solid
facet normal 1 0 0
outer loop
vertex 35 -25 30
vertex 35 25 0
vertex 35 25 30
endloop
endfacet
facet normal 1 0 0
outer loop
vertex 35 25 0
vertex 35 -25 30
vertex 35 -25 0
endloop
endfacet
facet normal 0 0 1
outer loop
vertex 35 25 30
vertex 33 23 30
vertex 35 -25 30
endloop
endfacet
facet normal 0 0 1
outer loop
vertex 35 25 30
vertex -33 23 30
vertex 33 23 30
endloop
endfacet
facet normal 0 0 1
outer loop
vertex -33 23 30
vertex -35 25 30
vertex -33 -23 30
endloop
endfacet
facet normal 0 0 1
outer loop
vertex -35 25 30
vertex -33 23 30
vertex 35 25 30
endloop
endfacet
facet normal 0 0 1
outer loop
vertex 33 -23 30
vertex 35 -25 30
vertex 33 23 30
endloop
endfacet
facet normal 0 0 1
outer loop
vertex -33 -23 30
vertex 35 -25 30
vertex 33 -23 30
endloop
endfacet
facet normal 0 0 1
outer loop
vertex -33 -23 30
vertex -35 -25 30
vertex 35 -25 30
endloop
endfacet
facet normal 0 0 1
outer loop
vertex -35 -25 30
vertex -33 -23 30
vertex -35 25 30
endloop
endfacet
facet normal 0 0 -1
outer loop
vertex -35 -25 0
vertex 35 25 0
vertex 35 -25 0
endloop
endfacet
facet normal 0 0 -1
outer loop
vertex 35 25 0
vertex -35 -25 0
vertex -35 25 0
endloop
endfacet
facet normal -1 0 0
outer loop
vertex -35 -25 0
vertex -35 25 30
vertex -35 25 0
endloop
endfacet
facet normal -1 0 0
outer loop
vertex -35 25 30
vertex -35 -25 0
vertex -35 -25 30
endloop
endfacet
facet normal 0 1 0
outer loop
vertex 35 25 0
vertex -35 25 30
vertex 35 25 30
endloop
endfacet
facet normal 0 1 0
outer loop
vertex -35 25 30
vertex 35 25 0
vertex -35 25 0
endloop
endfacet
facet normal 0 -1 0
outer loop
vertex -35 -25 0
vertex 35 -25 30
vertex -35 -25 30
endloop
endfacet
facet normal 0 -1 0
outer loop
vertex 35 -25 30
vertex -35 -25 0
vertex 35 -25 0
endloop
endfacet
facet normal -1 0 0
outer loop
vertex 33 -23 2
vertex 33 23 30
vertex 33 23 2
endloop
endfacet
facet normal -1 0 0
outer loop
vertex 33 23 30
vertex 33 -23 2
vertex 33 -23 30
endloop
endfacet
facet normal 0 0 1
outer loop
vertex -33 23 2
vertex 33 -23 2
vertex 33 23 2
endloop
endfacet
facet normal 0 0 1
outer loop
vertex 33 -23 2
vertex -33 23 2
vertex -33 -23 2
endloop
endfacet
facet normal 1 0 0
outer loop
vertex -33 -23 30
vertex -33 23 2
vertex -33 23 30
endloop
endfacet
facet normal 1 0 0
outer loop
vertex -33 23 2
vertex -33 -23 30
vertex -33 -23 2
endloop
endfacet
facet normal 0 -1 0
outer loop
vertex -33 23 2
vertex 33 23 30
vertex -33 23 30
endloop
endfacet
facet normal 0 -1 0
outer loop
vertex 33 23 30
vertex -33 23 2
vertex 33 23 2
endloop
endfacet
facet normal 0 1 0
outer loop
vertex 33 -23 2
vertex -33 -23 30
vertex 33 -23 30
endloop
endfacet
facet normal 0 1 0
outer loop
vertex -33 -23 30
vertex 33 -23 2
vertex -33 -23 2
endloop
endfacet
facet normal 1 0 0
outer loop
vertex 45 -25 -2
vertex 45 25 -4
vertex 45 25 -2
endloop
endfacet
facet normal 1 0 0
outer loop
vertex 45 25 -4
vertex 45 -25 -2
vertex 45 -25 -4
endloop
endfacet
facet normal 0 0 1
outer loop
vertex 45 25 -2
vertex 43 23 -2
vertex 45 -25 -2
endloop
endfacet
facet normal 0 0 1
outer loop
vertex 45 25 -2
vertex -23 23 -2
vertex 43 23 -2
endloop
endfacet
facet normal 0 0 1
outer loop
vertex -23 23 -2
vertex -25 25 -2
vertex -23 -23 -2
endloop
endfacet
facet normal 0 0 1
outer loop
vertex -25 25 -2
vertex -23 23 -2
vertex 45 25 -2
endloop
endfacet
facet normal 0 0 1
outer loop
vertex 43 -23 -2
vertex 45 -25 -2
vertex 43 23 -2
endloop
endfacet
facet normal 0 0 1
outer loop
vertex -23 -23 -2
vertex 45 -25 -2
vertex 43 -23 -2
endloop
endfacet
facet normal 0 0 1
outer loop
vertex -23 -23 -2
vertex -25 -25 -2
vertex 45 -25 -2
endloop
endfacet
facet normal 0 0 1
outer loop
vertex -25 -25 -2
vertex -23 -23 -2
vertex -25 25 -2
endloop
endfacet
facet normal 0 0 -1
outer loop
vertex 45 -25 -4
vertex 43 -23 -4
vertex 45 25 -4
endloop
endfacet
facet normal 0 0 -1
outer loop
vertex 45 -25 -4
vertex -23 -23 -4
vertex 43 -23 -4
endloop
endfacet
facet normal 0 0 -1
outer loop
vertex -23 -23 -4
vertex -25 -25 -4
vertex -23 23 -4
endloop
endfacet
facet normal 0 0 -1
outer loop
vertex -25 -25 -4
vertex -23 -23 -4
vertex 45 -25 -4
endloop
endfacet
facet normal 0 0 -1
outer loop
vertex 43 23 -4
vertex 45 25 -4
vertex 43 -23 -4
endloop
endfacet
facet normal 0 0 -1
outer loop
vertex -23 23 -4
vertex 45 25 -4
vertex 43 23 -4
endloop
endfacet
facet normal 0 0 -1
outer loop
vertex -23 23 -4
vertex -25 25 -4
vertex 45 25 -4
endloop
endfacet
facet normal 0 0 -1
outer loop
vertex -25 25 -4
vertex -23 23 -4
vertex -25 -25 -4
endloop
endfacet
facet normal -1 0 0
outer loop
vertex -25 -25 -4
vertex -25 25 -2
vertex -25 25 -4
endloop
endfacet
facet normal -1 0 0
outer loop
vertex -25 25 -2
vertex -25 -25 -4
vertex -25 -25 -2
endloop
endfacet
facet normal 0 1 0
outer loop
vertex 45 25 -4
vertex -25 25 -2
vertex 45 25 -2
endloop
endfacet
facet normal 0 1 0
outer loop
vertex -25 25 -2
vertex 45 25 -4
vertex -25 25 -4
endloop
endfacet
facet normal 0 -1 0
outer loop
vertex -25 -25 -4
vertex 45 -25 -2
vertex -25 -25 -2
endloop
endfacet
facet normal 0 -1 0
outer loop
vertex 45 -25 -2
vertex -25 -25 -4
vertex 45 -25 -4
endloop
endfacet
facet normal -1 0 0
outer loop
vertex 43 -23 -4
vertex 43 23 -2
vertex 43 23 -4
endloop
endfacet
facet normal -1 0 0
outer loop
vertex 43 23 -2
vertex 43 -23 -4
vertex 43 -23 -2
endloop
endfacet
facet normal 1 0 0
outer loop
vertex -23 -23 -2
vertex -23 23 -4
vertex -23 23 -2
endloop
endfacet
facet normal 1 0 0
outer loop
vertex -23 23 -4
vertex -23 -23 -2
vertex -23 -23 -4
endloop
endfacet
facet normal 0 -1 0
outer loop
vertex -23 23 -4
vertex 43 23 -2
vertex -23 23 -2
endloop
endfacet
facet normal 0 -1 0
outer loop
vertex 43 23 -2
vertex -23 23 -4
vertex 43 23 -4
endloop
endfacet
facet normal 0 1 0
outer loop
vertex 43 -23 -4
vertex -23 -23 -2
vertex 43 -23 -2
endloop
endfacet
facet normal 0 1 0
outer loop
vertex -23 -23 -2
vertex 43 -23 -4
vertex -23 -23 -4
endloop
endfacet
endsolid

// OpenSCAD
// Two-part enclosure for small electronics board
// Print orientation: both parts on the bed, lid on +X side of box

// ---- Box ----
box_x = 70;      // outer length (X)
box_y = 50;      // outer width (Y)
box_z = 30;      // outer height (Z)
wall = 2;        // wall thickness
floor = 2;       // floor thickness

// ---- Lid ----
lip_w = 65.6;    // lip outer length (X)
lip_d = 45.6;    // lip outer width (Y)
lip_h = 4;       // lip height (Z)
lip_t = 1.5;     // lip wall thickness

// ---- Misc ----
eps = 0.5;       // cutter overshoot
gap = 10;        // gap between parts

$fn = 64;

// Derived
inner_x = box_x - 2 * wall;
inner_y = box_y - 2 * wall;
lip_d2  = lip_d + 2 * wall;   // lip outer width includes side walls

module box() {
    difference() {
        translate([-box_x / 2, -box_y / 2, 0])
            cube([box_x, box_y, box_z]);
        translate([-inner_x / 2, -inner_y / 2, floor])
            cube([inner_x, inner_y, box_z - floor + eps]);
    }
}

module lid() {
    translate([0, 0, -lip_h])
        difference() {
            union() {
                // Plate
                translate([-box_x / 2, -box_y / 2, 0])
                    cube([box_x, box_y, 2]);
                // Lip
                translate([-lip_w / 2, -lip_d2 / 2, 0])
                    cube([lip_w, lip_d2, lip_t]);
            }
            // Cutout for board
            translate([-inner_x / 2, -inner_y / 2, 0])
                cube([inner_x, inner_y, 2 + eps]);
        }
}

box();
translate([gap, 0, 0])
    lid();
